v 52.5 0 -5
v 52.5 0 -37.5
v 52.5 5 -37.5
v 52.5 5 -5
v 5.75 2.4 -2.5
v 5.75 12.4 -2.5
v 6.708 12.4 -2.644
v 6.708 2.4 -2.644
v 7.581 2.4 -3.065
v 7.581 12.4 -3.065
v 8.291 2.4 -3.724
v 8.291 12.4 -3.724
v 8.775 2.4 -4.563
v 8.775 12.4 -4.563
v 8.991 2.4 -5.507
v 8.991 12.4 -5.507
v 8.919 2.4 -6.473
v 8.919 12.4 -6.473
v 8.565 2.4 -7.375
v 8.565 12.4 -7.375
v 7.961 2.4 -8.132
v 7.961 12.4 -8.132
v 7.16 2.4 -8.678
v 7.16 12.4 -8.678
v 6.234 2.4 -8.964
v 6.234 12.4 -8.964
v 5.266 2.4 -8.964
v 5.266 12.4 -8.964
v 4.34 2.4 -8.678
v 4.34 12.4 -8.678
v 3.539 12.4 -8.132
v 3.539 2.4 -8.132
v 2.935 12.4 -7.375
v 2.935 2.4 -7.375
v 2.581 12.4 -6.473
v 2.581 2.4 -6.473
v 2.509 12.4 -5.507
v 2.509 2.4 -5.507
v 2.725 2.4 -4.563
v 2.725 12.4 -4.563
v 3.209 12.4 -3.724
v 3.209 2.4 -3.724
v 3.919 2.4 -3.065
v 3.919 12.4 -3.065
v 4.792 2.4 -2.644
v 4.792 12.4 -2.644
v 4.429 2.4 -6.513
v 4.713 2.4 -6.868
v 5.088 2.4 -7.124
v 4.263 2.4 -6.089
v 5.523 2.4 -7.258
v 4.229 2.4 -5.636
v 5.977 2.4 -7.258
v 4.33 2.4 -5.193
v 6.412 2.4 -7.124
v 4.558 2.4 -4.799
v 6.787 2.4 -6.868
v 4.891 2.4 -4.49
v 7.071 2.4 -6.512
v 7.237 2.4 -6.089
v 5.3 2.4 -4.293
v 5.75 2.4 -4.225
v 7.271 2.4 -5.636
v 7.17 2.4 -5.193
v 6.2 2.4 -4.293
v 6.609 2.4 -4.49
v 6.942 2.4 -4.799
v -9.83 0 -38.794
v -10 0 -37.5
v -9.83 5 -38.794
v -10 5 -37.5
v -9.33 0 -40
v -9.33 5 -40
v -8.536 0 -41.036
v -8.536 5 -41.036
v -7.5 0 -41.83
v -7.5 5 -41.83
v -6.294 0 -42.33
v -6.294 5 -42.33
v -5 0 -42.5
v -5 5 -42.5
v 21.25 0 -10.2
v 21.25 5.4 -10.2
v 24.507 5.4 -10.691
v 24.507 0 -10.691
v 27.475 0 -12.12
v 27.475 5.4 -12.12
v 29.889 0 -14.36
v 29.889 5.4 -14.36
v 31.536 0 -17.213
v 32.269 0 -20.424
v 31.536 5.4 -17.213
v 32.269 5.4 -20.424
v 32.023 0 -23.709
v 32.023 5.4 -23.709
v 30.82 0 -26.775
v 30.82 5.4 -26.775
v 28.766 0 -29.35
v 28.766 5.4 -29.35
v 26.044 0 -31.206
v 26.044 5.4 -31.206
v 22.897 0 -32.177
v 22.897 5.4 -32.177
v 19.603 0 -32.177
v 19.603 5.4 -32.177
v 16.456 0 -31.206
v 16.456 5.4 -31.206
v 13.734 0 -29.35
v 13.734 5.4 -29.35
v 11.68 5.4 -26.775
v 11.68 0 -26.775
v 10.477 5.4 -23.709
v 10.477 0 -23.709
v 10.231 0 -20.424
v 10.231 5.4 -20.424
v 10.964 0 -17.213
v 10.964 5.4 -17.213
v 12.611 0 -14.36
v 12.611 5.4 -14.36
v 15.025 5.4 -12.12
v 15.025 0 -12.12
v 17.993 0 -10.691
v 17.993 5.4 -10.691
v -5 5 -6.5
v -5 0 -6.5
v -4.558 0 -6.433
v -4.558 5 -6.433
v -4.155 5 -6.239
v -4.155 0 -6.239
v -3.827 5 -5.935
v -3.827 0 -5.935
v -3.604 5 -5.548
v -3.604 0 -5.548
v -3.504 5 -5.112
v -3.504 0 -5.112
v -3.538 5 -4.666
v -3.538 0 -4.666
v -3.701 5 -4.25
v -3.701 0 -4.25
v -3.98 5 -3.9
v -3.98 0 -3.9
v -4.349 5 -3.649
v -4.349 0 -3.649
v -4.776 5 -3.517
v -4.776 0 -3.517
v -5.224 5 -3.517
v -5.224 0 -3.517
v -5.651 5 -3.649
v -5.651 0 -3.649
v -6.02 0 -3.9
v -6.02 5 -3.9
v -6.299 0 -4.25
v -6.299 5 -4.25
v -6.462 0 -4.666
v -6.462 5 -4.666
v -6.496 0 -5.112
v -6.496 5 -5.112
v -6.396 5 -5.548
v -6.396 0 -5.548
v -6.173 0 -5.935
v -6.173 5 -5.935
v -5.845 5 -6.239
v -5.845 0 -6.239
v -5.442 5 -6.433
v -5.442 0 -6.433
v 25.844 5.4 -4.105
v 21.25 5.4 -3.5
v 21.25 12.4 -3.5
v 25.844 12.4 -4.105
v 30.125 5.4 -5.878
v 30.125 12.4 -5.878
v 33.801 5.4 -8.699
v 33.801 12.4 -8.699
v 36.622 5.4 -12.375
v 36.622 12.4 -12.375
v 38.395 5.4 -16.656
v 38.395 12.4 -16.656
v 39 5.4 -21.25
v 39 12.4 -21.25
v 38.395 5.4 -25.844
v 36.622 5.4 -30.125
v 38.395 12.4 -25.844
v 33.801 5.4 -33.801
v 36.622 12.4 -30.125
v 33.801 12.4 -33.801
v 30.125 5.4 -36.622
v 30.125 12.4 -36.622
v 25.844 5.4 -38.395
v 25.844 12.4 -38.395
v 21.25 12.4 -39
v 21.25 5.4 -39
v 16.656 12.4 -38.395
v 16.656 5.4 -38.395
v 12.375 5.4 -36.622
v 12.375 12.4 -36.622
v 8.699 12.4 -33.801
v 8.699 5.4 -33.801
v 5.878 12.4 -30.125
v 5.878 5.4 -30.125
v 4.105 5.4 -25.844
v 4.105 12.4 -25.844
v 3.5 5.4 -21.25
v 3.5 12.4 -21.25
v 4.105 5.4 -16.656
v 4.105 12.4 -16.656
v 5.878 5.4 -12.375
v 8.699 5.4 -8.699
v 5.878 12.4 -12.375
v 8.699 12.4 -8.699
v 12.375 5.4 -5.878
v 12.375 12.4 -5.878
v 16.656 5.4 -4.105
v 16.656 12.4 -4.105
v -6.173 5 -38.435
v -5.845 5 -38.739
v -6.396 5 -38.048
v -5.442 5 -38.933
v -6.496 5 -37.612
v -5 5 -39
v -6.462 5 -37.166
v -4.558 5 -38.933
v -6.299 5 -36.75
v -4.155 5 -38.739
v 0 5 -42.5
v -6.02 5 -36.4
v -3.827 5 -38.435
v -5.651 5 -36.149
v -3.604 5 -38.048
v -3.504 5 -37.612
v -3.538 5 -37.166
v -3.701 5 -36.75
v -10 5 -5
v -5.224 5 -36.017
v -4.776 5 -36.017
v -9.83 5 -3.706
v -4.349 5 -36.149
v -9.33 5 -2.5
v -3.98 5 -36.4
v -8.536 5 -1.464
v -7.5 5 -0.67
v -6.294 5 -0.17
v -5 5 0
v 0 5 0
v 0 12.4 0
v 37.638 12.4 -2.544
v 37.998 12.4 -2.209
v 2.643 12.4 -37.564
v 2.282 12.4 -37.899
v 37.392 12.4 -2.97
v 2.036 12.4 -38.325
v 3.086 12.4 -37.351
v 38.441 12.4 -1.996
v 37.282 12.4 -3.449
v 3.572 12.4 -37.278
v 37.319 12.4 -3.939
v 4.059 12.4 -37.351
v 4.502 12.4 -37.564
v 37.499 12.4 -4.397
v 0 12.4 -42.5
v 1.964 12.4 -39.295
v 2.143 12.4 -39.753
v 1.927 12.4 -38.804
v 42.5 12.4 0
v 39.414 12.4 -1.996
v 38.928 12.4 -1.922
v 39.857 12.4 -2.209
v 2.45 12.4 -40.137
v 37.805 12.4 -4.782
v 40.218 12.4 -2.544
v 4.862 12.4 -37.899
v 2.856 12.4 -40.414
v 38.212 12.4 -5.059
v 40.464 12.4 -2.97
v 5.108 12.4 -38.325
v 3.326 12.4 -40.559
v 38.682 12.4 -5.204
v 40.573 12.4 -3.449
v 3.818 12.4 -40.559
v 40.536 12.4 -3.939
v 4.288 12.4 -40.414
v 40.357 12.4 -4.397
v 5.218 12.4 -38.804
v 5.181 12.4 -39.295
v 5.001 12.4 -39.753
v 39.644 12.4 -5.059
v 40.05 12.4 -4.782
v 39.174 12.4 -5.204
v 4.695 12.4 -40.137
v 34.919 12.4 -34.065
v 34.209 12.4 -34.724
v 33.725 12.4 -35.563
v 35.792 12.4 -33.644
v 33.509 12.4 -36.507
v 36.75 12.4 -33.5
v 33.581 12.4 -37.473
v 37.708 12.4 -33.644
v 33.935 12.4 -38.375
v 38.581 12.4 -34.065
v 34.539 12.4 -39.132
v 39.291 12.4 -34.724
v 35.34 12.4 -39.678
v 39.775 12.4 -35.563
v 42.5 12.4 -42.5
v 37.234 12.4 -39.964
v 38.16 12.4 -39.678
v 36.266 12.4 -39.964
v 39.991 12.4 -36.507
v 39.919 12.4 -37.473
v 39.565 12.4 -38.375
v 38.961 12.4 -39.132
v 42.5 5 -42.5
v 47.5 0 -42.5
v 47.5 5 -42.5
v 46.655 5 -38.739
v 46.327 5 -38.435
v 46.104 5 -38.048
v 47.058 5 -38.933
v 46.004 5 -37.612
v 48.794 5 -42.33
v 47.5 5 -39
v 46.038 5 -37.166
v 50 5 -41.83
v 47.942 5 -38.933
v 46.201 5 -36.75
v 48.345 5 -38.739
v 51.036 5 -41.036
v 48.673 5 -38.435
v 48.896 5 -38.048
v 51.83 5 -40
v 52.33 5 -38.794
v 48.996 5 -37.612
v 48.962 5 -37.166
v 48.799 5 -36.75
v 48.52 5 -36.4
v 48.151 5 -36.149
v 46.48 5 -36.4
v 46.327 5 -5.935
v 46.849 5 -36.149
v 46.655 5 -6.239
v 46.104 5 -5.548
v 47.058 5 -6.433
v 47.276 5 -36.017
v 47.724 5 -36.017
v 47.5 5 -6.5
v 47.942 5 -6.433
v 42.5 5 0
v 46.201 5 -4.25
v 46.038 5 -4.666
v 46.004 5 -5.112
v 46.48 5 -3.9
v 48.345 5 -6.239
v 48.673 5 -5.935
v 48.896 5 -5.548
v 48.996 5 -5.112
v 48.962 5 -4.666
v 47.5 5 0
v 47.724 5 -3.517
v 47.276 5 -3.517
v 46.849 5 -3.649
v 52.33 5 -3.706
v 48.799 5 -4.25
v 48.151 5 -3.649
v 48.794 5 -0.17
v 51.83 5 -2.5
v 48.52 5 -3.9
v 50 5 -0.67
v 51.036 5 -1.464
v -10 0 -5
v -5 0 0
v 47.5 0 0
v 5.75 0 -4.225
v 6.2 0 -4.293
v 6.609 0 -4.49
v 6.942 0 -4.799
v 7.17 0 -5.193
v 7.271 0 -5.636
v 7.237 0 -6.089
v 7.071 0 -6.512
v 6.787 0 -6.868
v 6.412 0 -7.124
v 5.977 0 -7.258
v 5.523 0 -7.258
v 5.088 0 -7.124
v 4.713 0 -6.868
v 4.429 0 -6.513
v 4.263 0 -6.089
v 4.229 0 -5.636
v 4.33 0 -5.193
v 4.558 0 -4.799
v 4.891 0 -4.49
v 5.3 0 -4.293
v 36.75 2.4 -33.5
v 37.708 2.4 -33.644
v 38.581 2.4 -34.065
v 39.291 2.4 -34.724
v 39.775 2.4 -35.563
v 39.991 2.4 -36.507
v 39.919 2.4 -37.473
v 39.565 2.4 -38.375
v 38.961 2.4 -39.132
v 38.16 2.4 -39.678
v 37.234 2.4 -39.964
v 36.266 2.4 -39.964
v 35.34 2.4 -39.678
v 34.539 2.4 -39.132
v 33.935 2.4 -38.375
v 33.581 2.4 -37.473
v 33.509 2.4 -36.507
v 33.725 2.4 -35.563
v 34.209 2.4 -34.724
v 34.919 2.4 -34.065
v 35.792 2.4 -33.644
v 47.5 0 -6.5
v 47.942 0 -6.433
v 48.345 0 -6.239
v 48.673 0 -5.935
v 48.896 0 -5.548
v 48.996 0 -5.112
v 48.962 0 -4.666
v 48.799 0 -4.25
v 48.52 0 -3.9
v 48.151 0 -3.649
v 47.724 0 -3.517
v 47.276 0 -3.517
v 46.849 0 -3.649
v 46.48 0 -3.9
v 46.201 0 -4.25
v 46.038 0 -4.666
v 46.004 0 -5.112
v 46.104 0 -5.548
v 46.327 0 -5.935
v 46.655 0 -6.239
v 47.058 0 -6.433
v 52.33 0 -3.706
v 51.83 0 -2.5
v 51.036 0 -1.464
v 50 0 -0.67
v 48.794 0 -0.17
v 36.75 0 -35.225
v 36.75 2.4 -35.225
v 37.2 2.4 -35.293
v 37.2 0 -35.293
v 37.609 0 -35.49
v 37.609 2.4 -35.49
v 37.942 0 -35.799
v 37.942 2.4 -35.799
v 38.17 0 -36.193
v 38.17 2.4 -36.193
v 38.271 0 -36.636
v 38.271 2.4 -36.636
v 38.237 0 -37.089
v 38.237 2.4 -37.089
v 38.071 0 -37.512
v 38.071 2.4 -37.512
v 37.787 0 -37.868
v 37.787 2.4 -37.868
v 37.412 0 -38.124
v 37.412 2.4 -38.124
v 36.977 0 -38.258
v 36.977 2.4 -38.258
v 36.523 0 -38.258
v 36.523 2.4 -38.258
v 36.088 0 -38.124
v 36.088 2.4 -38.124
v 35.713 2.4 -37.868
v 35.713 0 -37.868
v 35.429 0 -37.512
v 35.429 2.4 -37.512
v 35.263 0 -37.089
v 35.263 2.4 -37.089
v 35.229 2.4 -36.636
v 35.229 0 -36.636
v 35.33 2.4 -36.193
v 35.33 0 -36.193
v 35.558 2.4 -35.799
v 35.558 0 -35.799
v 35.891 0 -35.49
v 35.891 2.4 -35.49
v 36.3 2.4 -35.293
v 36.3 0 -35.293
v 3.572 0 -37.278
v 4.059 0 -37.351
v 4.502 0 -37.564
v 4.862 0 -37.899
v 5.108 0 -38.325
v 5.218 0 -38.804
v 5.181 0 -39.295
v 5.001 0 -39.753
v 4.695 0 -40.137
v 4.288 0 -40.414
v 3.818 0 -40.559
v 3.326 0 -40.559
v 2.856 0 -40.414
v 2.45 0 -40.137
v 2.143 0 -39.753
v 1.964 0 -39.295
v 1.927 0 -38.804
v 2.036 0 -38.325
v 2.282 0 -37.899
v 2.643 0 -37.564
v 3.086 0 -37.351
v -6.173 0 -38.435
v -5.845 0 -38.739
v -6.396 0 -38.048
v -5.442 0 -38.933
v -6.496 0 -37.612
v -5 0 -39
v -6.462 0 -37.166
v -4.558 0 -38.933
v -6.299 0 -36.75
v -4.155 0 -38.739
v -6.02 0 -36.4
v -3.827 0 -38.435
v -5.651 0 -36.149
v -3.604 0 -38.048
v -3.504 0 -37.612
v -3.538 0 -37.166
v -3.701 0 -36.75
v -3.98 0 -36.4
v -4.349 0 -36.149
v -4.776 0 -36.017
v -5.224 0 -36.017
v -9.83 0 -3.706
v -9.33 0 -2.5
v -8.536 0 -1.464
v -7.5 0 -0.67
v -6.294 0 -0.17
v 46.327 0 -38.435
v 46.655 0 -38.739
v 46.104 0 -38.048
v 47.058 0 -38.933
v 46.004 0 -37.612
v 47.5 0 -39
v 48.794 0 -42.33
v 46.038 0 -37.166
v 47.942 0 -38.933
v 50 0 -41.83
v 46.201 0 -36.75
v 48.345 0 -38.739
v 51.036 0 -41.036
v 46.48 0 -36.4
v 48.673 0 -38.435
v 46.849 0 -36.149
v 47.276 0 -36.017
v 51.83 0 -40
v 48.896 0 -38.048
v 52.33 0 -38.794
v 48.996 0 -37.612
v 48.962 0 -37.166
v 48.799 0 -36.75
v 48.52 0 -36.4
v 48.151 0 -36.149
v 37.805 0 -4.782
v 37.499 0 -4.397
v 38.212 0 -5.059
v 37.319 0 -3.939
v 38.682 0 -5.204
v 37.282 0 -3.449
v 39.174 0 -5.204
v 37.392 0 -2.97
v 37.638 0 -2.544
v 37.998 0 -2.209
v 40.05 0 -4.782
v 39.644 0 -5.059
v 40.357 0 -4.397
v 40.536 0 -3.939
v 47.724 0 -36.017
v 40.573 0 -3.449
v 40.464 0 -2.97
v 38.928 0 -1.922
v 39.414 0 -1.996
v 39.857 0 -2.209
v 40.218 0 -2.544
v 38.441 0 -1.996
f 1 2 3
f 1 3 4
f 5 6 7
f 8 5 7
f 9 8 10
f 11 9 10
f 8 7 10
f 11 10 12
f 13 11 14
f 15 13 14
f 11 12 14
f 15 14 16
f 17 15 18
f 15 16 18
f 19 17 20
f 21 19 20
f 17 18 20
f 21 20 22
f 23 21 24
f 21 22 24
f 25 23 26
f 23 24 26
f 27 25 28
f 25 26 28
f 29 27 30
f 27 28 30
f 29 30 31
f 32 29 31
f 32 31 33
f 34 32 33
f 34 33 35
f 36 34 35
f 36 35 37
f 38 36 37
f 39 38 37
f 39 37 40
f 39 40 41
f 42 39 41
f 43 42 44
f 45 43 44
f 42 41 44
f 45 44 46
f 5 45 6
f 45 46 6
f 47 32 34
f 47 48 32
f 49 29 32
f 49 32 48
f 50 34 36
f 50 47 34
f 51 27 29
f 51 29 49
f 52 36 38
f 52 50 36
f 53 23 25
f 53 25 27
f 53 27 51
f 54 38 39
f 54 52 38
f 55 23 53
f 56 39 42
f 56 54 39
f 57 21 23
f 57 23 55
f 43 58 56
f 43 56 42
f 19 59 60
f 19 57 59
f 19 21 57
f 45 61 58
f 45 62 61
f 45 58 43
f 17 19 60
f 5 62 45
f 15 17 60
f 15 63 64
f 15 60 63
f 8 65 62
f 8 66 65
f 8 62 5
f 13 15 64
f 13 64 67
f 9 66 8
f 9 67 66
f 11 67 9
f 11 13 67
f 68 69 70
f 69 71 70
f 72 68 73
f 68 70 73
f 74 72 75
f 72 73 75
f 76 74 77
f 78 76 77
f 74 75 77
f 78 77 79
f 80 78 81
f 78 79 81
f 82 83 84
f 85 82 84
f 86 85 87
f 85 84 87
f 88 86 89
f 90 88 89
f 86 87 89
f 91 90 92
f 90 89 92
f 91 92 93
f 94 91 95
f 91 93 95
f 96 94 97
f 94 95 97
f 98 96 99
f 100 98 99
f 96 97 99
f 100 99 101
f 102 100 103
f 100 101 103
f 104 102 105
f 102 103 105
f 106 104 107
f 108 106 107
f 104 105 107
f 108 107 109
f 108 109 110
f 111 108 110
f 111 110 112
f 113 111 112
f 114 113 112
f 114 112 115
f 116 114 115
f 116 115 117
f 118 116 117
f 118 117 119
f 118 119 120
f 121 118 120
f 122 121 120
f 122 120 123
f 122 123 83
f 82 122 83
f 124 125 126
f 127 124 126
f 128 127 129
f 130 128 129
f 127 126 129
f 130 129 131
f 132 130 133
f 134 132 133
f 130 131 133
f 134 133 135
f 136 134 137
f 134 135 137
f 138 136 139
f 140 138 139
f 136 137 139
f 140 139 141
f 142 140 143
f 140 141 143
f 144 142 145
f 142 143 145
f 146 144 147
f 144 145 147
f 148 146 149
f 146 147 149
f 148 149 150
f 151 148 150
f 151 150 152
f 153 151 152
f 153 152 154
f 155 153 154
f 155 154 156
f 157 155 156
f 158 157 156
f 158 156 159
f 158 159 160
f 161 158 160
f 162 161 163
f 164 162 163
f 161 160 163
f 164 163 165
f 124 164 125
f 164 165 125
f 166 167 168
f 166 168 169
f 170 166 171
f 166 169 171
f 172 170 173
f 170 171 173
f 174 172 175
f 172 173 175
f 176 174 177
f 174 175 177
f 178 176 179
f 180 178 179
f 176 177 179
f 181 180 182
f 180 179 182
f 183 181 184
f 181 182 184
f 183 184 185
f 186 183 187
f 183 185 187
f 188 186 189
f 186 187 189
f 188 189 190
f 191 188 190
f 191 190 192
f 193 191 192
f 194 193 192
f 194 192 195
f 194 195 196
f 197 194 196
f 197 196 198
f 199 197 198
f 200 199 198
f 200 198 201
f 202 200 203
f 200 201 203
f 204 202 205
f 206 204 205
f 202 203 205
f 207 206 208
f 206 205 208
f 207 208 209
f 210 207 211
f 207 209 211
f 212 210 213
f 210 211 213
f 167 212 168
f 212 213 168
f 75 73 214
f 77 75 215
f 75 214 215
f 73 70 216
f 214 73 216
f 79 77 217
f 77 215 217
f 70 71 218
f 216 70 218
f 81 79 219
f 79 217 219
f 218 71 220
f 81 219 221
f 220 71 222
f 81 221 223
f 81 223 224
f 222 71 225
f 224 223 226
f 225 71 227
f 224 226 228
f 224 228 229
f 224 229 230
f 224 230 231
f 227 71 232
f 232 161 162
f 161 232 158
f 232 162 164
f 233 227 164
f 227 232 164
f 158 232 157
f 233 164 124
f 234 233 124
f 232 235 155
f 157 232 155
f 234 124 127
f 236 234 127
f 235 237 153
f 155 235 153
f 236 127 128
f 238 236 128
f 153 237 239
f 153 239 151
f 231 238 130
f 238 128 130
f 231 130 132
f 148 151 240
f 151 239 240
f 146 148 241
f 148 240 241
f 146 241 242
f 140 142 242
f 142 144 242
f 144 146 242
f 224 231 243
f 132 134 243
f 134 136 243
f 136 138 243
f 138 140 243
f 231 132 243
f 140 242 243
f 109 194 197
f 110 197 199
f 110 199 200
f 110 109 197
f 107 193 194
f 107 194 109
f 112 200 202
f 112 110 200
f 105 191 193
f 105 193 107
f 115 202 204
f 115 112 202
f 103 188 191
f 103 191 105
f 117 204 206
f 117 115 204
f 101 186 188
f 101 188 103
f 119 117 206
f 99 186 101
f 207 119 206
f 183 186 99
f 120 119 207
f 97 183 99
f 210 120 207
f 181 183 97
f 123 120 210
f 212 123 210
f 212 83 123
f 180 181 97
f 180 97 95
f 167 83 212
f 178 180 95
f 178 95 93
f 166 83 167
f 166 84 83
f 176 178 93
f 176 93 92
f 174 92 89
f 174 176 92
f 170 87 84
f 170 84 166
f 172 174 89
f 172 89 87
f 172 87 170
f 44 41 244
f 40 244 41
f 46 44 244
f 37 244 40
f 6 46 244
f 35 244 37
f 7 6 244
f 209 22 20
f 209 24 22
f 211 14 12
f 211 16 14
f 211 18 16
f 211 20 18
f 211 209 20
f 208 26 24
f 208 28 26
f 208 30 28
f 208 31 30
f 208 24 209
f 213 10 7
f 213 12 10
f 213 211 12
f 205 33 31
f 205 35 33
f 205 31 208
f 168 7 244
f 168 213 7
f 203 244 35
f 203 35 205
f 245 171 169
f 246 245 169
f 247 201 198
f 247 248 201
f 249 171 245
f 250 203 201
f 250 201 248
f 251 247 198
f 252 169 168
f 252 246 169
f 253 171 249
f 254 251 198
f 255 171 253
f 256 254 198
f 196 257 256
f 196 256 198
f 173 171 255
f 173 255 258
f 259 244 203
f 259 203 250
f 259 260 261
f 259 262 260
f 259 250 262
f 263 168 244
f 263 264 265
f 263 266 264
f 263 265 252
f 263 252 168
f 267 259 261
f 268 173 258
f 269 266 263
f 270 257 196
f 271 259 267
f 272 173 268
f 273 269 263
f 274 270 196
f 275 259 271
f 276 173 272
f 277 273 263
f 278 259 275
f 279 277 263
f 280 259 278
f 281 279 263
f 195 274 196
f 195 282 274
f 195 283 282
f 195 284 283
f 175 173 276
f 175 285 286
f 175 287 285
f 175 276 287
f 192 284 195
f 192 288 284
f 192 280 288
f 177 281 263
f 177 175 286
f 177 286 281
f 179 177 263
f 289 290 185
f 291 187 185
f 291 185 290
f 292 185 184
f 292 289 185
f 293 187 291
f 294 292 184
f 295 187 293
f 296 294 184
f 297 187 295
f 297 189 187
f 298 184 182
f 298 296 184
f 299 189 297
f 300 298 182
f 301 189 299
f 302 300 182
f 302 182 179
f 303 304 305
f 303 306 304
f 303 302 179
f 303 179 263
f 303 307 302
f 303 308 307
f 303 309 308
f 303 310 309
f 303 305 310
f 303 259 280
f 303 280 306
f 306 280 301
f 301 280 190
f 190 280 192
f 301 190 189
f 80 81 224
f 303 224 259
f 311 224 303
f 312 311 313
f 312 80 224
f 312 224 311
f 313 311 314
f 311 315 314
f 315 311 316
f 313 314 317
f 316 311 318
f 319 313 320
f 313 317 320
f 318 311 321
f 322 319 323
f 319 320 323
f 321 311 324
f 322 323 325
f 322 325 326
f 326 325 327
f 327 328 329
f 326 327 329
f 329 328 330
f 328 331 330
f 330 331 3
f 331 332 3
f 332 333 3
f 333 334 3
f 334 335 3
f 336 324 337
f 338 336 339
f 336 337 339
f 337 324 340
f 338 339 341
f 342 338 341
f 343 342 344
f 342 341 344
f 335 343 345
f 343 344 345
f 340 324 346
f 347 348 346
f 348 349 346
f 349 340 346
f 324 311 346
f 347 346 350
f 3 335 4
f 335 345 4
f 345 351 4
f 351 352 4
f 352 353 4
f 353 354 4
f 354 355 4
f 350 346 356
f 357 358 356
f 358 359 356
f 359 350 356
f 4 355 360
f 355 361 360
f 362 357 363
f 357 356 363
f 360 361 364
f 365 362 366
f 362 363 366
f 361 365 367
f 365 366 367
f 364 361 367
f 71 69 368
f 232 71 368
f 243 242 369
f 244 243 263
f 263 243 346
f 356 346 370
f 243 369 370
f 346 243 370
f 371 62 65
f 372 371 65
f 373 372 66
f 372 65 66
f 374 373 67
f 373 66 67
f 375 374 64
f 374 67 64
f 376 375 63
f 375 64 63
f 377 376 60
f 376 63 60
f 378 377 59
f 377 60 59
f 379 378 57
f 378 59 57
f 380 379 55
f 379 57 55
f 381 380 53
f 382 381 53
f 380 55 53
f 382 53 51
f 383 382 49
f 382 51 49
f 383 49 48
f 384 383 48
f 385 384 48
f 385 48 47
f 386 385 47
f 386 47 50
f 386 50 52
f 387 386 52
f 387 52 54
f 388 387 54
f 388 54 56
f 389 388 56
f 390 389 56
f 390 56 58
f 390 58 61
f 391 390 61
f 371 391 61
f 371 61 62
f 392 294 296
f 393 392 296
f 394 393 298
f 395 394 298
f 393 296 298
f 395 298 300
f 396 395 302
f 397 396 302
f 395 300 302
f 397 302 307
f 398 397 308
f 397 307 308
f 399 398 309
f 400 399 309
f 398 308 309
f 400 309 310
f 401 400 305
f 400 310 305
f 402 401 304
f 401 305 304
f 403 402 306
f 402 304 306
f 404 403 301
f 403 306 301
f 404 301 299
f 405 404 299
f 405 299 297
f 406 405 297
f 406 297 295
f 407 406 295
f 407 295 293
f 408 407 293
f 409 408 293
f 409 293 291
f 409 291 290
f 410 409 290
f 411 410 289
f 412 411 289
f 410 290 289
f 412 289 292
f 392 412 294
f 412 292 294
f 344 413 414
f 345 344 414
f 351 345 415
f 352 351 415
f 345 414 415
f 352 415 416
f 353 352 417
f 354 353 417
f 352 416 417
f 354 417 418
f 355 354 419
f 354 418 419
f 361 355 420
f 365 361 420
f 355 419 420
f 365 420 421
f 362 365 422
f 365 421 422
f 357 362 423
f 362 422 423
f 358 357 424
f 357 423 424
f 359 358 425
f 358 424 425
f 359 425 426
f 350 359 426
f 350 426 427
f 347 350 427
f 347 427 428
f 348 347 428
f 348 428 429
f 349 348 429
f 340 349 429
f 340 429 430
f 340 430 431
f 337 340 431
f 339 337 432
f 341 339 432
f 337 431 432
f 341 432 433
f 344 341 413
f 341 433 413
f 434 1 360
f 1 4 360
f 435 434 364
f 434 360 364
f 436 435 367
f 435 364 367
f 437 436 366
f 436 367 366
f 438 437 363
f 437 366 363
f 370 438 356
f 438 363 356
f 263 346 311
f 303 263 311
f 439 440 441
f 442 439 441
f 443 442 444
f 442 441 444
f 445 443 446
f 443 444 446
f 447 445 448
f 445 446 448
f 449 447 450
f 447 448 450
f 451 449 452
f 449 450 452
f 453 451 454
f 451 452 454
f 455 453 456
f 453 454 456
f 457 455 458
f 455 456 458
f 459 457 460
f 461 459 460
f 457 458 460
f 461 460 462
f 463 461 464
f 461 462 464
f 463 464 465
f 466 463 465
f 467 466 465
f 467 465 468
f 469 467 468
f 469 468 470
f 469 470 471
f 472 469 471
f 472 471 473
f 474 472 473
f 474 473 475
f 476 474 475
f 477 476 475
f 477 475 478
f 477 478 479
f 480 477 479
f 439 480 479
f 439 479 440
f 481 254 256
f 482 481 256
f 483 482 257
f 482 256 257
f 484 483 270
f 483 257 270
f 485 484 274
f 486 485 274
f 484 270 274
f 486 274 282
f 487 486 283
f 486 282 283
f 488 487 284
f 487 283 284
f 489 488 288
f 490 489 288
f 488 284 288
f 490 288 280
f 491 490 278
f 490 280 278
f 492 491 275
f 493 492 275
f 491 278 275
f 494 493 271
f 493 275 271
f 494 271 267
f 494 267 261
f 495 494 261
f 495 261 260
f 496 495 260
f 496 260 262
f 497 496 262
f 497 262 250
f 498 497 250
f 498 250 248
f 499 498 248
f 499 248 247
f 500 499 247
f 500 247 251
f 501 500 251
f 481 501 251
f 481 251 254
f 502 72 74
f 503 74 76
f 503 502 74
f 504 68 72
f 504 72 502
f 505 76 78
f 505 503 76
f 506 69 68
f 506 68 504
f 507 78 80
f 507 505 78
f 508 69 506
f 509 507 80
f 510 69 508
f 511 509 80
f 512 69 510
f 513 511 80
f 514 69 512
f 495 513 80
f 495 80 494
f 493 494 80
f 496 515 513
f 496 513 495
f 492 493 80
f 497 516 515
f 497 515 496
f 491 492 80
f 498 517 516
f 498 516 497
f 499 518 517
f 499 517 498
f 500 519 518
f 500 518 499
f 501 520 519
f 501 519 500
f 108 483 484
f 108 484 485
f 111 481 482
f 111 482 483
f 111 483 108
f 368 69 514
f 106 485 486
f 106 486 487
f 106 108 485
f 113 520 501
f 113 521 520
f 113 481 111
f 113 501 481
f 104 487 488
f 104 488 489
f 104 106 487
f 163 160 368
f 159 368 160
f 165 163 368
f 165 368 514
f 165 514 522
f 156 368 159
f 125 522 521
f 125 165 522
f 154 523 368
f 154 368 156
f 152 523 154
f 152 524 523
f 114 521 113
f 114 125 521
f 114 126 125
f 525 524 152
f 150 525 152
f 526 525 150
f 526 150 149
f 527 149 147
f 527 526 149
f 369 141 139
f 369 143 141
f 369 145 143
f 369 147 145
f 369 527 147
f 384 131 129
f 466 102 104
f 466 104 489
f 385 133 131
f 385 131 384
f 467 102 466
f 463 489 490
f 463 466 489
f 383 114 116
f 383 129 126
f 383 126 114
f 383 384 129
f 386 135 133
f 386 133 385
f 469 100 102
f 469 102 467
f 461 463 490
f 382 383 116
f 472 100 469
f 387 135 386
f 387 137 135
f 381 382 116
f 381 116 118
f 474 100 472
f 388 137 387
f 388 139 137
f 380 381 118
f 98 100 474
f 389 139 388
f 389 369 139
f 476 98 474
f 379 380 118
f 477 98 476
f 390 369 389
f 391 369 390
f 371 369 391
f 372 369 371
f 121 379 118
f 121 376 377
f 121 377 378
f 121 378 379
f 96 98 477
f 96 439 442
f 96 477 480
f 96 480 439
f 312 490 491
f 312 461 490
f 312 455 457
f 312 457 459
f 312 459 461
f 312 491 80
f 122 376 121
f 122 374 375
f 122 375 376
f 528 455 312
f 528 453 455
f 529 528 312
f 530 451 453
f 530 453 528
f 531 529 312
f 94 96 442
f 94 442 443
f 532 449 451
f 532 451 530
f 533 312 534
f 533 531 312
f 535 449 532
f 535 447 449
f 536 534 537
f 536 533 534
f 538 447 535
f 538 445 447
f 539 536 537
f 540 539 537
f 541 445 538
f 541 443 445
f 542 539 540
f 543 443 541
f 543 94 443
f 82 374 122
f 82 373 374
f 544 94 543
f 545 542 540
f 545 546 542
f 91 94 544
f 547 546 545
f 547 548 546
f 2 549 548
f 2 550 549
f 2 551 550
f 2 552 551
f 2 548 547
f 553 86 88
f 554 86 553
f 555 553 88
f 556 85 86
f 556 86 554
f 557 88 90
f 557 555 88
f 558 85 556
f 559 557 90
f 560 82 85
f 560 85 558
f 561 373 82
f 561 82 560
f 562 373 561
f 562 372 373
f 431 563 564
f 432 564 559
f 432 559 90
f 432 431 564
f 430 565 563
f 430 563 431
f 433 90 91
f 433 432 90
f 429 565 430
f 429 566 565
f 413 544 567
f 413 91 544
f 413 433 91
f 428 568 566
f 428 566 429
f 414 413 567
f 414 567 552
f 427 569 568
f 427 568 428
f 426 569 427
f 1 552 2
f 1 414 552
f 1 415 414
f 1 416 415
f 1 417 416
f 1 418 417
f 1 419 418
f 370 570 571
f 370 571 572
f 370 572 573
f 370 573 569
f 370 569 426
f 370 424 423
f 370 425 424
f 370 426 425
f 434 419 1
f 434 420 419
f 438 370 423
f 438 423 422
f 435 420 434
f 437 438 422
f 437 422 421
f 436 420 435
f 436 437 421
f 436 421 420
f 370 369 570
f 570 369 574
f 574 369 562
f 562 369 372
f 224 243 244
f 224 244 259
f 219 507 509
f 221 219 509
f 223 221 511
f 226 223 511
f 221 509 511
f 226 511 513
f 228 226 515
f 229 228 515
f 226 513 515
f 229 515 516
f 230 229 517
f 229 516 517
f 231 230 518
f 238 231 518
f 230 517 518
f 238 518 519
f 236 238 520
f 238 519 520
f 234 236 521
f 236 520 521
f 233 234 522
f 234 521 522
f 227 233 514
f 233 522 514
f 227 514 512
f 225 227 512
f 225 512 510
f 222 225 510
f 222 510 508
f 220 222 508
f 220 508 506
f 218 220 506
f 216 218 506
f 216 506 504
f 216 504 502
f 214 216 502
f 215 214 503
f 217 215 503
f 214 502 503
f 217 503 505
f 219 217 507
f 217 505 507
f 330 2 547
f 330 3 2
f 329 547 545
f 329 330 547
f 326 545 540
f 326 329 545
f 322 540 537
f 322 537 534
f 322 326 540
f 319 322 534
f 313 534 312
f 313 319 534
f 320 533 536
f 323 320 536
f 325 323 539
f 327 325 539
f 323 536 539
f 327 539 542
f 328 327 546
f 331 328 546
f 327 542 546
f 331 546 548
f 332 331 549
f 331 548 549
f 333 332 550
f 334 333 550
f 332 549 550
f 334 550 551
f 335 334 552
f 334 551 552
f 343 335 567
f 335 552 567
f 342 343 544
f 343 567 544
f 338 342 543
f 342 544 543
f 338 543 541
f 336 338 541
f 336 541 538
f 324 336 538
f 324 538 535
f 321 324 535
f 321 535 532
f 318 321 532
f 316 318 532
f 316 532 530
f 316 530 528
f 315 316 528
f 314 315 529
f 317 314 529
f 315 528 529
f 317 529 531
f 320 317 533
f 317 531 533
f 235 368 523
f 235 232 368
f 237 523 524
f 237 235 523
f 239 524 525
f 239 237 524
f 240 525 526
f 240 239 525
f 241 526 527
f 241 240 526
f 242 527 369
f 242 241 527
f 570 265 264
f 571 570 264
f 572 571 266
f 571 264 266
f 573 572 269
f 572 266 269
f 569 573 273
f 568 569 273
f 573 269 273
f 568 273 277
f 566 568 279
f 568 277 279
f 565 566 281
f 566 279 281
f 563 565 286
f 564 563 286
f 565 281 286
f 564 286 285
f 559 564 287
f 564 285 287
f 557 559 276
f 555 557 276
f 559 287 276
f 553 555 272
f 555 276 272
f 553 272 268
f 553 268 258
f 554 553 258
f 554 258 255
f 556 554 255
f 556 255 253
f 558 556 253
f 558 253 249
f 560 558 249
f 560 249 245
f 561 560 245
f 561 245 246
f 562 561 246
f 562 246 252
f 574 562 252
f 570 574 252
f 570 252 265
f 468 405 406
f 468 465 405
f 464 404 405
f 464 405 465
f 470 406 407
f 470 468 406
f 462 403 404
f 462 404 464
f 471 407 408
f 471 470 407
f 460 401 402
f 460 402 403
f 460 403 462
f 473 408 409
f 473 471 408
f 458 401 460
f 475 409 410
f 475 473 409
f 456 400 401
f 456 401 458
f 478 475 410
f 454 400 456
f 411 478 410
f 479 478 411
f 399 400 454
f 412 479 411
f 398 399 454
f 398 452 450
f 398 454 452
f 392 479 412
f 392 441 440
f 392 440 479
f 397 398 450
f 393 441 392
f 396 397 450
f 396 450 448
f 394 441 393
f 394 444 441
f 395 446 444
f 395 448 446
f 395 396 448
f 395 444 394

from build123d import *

# Parameters (mm, degrees)
SKETCH_1_W          = 42.5
SKETCH_1_H          = 42.5
EXTRUDE_1_DEPTH     = 12.4
SKETCH_2_R          = 17.75
CUT_EXTRUDE_1_DEPTH = 7
SKETCH_3_R          = 11.05
CUT_EXTRUDE_2_DEPTH = 61.510329697
SKETCH_4_R          = 3.25
CUT_EXTRUDE_3_DEPTH = 10
SKETCH_4_3_R        = 1.65
SKETCH_4_3_R_2      = 1.525
CUT_EXTRUDE_4_DEPTH = 62.36986231
SKETCH_5_W          = 10
SKETCH_5_H          = 42.5
SKETCH_5_R          = 1.5
EXTRUDE_2_DEPTH     = 5
FILLET_1_R          = 5


with BuildPart() as part:
    # 草图1 → 凸台-拉伸1 (new body)
    with BuildSketch(Plane(origin=(0, 0, 0), x_dir=(1, 0, 0), z_dir=(0, 1, 0))):
        with Locations((21.25, 21.25)):
            Rectangle(SKETCH_1_W, SKETCH_1_H)
    extrude(amount=EXTRUDE_1_DEPTH)

    # 草图2 → 切除-拉伸1 (cut)
    with BuildSketch(Plane(origin=(0, 12.4, 0), x_dir=(1, 0, 0), z_dir=(0, 1, 0))):
        with Locations((21.25, 21.25)):
            Circle(SKETCH_2_R)
    extrude(amount=-CUT_EXTRUDE_1_DEPTH, mode=Mode.SUBTRACT)

    # 草图3 → 切除-拉伸2 (cut, through all)
    with BuildSketch(Plane(origin=(0, 5.4, 0), x_dir=(1, 0, 0), z_dir=(0, 1, 0))):
        with Locations((21.25, 21.25)):
            Circle(SKETCH_3_R)
    extrude(amount=-CUT_EXTRUDE_2_DEPTH, mode=Mode.SUBTRACT)

    # 草图4 → 切除-拉伸3 (cut)
    with BuildSketch(Plane(origin=(0, 12.4, 0), x_dir=(1, 0, 0), z_dir=(0, 1, 0))):
        with Locations((36.75, 36.75)):
            Circle(SKETCH_4_R)
        with Locations((5.75, 5.75)):
            Circle(SKETCH_4_R)
    extrude(amount=-CUT_EXTRUDE_3_DEPTH, mode=Mode.SUBTRACT)

    # 草图4<3> → 切除-拉伸4 (cut, through all)
    with BuildSketch(Plane(origin=(0, 12.4, 0), x_dir=(1, 0, 0), z_dir=(0, 1, 0))):
        with Locations((3.57233047, 38.92766953)):
            Circle(SKETCH_4_3_R)
        with Locations((38.92766953, 3.57233047)):
            Circle(SKETCH_4_3_R)
        with Locations((5.75, 5.75)):
            Circle(SKETCH_4_3_R_2)
        with Locations((36.75, 36.75)):
            Circle(SKETCH_4_3_R_2)
    extrude(amount=-CUT_EXTRUDE_4_DEPTH, mode=Mode.SUBTRACT)

    # 草图5 → 凸台-拉伸2 (add)
    # profile 1 of 2: a face of its own
    with BuildSketch(Plane.XZ):
        with Locations((-5, -21.25)):
            Rectangle(SKETCH_5_W, SKETCH_5_H)
        with Locations((-5, -5)):
            Circle(SKETCH_5_R, mode=Mode.SUBTRACT)
        with Locations((-5, -37.5)):
            Circle(SKETCH_5_R, mode=Mode.SUBTRACT)
    # profile 2 of 2: a face of its own
    with BuildSketch(Plane.XZ):
        with Locations((47.5, -21.25)):
            Rectangle(SKETCH_5_W, SKETCH_5_H)
        with Locations((47.5, -37.5)):
            Circle(SKETCH_5_R, mode=Mode.SUBTRACT)
        with Locations((47.5, -5)):
            Circle(SKETCH_5_R, mode=Mode.SUBTRACT)
    extrude(amount=-EXTRUDE_2_DEPTH)

    # 圆角1
    fillet_1_edges = [part.edges().sort_by_distance(p)[0] for p in [
        (-10, 2.5, 0),
        (52.5, 2.5, 0),
        (52.5, 2.5, -42.5),
        (-10, 2.5, -42.5),
    ]]
    fillet(fillet_1_edges, radius=FILLET_1_R)


solid = part.part
